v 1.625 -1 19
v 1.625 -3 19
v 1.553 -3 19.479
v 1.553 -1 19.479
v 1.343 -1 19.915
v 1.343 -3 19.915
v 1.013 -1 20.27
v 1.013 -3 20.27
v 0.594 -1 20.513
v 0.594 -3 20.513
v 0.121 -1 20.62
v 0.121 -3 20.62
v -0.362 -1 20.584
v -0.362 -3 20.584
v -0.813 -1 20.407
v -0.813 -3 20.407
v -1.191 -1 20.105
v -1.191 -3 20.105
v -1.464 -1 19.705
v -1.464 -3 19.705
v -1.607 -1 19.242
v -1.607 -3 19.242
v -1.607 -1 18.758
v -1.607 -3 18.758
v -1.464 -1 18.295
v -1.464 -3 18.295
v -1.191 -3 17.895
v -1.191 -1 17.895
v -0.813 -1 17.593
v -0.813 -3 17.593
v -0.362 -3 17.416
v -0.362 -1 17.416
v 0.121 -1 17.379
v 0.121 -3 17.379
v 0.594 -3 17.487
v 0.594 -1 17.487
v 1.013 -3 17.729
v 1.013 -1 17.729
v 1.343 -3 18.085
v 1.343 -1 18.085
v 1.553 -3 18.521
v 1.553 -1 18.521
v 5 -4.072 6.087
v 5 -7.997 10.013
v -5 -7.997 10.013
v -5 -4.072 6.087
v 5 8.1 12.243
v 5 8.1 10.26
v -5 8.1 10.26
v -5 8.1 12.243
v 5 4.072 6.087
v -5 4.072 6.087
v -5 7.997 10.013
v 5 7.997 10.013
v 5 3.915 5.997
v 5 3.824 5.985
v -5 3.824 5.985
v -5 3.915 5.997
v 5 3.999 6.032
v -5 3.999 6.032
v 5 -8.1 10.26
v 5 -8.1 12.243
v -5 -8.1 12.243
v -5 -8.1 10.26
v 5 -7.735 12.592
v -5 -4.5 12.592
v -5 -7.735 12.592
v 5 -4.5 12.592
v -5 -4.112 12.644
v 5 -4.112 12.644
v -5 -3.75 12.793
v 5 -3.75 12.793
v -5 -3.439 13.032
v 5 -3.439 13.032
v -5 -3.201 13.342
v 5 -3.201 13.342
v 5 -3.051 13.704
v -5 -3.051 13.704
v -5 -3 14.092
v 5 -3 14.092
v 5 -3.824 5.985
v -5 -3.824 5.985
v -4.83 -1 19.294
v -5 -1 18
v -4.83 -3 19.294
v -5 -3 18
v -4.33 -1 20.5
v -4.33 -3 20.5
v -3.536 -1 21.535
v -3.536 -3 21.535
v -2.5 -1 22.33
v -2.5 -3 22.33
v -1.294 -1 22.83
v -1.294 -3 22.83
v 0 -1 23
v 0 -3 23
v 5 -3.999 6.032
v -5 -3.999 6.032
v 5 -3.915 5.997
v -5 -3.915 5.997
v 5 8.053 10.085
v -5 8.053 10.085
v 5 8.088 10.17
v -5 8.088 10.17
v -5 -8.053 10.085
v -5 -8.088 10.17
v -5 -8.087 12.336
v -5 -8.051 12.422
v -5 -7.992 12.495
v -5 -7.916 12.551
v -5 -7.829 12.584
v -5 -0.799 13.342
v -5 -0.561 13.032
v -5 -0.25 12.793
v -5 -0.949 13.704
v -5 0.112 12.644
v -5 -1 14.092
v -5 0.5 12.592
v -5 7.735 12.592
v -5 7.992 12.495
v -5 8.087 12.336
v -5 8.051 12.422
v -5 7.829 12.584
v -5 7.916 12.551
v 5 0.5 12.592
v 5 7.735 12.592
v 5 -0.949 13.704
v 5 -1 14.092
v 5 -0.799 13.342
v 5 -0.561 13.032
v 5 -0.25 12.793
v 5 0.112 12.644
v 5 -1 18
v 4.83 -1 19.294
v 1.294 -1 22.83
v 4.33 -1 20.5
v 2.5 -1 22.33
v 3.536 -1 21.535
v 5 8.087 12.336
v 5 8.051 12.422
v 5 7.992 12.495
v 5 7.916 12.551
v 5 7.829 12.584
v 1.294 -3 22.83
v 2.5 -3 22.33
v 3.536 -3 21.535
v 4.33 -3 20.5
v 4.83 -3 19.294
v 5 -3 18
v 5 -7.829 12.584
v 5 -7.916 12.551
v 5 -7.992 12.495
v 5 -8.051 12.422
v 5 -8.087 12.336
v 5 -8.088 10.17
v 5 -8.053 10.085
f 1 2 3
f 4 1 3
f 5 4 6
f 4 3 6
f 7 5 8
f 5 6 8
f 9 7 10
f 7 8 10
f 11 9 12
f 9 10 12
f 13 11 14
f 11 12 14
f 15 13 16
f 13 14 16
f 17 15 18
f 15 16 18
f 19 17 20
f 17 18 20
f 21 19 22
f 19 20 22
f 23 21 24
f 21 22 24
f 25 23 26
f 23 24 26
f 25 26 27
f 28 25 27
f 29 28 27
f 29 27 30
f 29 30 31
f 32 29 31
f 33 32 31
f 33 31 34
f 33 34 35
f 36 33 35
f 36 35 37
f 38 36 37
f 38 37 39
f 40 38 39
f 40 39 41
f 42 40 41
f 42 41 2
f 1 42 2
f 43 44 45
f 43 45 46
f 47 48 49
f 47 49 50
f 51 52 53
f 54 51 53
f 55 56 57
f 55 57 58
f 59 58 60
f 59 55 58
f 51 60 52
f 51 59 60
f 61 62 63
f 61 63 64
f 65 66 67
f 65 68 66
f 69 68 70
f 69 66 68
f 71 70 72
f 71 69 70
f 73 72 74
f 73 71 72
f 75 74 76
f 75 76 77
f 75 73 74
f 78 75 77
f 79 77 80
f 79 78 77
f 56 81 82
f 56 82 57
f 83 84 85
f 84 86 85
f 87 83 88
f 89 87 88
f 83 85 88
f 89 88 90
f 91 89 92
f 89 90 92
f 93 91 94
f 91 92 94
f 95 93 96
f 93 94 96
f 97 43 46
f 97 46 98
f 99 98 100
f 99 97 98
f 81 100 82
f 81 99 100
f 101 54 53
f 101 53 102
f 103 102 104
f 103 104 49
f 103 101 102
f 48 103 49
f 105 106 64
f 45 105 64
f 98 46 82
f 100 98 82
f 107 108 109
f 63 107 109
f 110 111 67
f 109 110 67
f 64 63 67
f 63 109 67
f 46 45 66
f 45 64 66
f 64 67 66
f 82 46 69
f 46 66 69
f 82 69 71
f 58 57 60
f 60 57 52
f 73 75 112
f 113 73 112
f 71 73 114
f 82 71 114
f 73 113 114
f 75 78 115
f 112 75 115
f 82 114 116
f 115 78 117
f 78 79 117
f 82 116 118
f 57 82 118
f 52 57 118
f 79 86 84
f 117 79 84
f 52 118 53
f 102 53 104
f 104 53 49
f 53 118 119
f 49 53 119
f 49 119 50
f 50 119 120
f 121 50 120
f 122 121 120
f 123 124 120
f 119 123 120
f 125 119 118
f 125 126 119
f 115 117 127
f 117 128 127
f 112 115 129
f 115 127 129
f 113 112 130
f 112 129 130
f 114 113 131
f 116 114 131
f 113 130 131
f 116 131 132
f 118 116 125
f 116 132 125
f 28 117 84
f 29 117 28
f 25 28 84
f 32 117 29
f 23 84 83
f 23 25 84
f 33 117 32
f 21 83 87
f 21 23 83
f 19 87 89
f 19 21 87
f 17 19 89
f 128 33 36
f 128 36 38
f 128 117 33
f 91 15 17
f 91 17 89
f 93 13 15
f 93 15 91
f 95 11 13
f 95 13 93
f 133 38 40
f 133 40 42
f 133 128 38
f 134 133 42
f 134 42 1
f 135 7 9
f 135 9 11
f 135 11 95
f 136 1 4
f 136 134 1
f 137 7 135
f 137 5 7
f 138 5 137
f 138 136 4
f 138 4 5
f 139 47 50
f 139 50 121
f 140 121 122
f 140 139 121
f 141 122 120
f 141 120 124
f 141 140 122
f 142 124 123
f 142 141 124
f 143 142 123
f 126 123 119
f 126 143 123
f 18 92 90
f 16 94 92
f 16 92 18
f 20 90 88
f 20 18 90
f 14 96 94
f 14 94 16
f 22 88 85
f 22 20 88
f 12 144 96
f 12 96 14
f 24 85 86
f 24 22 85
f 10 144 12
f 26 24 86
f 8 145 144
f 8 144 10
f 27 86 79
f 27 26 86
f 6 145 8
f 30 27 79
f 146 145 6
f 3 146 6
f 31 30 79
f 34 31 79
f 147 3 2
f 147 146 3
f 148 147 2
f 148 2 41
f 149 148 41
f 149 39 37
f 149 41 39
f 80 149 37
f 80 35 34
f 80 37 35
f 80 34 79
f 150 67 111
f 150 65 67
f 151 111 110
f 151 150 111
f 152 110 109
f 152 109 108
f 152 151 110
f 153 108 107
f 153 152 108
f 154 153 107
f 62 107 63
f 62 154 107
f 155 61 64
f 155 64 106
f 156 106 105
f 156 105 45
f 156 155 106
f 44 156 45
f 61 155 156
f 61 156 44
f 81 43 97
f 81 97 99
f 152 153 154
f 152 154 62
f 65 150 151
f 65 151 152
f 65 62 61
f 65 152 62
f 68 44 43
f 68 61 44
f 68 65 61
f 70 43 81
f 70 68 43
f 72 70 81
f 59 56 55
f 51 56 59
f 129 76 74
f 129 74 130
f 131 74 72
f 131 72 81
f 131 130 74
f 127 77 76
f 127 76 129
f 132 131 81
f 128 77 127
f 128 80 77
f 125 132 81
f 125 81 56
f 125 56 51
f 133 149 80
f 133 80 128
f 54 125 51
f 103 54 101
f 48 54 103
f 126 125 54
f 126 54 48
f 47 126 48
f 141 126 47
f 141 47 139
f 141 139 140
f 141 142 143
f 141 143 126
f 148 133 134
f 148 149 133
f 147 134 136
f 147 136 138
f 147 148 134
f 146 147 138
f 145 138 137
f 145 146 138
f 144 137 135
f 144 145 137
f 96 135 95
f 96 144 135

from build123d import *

# Parameters (mm, degrees)
F2_DEPTH = 5
F3_R     = 1.5
F4_R     = 4.99999
F6_D     = 3.25


# Not quite as in the source:
# - a fillet or chamfer is up to 0.001 mm smaller than in the source, because OpenCascade refuses the exact size


with BuildPart() as f2:
    # F1 (on Right) → F2 (new body, symmetric)
    with BuildSketch(Plane.YZ):
        with BuildLine():
            Line((-4.5, 12.592475), (-7.7353845436, 12.592475))
            ThreePointArc((-7.7353845436, 12.592475), (-7.9922437092, 12.4953707173), (-8.099967, 12.242781))
            Line((-8.099967, 12.242781), (-8.099967, 10.260188))
            ThreePointArc((-8.099967, 10.260188), (-8.0733249886, 10.126249564), (-7.9974549592, 10.0127020408))
            Line((-7.9974549828, 10.0127020172), (-4.0719369828, 6.0871840172))
            ThreePointArc((-4.0719369592, 6.0871840408), (-3.958389436, 6.0113140114), (-3.824451, 5.984672))
            Line((-3.824451, 5.984672), (-0.949996, 5.984672))
            Line((-0.949996, 5.984672), (0.949996, 5.984672))
            Line((0.949996, 5.984672), (3.824451, 5.984672))
            ThreePointArc((3.824451, 5.984672), (3.958389436, 6.0113140114), (4.0719369592, 6.0871840408))
            Line((4.0719369828, 6.0871840172), (7.9974549828, 10.0127020172))
            ThreePointArc((7.9974549592, 10.0127020408), (8.0733249886, 10.126249564), (8.099967, 10.260188))
            Line((8.099967, 10.260188), (8.099967, 12.242781))
            ThreePointArc((8.099967, 12.242781), (7.9922437092, 12.4953707173), (7.7353845436, 12.592475))
            Line((7.7353845436, 12.592475), (4.5, 12.592475))
            Line((4.5, 12.592475), (-1, 12.592475))
            Line((-1, 12.592475), (-1, 22.99994))
            Line((-1, 22.99994), (-3, 22.99994))
            Line((-3, 22.99994), (-3, 12.592475))
            Line((-3, 12.592475), (-4.5, 12.592475))
        make_face()
    extrude(amount=F2_DEPTH, both=True)

    # F3
    f3_edges = [f2.edges().sort_by_distance(p)[0] for p in [
        (0, -3, 12.592475),
        (0, -1, 12.592475),
    ]]
    fillet(f3_edges, radius=F3_R)

    # F4 (radius 5 in the source; OpenCascade refuses exactly that, so slightly less here)
    f4_edges = [f2.edges().sort_by_distance(p)[0] for p in [
        (5, -2, 22.99994),
        (-5, -2, 22.99994),
    ]]
    fillet(f4_edges, radius=F4_R)

    # F6 (through all)
    with Locations(Plane(origin=(0, -1, 0), x_dir=(-1, 0, 0), z_dir=(0, 1, 0))):
        with Locations((0, 18.99994)):
            Hole(F6_D / 2)


solid = f2.part
